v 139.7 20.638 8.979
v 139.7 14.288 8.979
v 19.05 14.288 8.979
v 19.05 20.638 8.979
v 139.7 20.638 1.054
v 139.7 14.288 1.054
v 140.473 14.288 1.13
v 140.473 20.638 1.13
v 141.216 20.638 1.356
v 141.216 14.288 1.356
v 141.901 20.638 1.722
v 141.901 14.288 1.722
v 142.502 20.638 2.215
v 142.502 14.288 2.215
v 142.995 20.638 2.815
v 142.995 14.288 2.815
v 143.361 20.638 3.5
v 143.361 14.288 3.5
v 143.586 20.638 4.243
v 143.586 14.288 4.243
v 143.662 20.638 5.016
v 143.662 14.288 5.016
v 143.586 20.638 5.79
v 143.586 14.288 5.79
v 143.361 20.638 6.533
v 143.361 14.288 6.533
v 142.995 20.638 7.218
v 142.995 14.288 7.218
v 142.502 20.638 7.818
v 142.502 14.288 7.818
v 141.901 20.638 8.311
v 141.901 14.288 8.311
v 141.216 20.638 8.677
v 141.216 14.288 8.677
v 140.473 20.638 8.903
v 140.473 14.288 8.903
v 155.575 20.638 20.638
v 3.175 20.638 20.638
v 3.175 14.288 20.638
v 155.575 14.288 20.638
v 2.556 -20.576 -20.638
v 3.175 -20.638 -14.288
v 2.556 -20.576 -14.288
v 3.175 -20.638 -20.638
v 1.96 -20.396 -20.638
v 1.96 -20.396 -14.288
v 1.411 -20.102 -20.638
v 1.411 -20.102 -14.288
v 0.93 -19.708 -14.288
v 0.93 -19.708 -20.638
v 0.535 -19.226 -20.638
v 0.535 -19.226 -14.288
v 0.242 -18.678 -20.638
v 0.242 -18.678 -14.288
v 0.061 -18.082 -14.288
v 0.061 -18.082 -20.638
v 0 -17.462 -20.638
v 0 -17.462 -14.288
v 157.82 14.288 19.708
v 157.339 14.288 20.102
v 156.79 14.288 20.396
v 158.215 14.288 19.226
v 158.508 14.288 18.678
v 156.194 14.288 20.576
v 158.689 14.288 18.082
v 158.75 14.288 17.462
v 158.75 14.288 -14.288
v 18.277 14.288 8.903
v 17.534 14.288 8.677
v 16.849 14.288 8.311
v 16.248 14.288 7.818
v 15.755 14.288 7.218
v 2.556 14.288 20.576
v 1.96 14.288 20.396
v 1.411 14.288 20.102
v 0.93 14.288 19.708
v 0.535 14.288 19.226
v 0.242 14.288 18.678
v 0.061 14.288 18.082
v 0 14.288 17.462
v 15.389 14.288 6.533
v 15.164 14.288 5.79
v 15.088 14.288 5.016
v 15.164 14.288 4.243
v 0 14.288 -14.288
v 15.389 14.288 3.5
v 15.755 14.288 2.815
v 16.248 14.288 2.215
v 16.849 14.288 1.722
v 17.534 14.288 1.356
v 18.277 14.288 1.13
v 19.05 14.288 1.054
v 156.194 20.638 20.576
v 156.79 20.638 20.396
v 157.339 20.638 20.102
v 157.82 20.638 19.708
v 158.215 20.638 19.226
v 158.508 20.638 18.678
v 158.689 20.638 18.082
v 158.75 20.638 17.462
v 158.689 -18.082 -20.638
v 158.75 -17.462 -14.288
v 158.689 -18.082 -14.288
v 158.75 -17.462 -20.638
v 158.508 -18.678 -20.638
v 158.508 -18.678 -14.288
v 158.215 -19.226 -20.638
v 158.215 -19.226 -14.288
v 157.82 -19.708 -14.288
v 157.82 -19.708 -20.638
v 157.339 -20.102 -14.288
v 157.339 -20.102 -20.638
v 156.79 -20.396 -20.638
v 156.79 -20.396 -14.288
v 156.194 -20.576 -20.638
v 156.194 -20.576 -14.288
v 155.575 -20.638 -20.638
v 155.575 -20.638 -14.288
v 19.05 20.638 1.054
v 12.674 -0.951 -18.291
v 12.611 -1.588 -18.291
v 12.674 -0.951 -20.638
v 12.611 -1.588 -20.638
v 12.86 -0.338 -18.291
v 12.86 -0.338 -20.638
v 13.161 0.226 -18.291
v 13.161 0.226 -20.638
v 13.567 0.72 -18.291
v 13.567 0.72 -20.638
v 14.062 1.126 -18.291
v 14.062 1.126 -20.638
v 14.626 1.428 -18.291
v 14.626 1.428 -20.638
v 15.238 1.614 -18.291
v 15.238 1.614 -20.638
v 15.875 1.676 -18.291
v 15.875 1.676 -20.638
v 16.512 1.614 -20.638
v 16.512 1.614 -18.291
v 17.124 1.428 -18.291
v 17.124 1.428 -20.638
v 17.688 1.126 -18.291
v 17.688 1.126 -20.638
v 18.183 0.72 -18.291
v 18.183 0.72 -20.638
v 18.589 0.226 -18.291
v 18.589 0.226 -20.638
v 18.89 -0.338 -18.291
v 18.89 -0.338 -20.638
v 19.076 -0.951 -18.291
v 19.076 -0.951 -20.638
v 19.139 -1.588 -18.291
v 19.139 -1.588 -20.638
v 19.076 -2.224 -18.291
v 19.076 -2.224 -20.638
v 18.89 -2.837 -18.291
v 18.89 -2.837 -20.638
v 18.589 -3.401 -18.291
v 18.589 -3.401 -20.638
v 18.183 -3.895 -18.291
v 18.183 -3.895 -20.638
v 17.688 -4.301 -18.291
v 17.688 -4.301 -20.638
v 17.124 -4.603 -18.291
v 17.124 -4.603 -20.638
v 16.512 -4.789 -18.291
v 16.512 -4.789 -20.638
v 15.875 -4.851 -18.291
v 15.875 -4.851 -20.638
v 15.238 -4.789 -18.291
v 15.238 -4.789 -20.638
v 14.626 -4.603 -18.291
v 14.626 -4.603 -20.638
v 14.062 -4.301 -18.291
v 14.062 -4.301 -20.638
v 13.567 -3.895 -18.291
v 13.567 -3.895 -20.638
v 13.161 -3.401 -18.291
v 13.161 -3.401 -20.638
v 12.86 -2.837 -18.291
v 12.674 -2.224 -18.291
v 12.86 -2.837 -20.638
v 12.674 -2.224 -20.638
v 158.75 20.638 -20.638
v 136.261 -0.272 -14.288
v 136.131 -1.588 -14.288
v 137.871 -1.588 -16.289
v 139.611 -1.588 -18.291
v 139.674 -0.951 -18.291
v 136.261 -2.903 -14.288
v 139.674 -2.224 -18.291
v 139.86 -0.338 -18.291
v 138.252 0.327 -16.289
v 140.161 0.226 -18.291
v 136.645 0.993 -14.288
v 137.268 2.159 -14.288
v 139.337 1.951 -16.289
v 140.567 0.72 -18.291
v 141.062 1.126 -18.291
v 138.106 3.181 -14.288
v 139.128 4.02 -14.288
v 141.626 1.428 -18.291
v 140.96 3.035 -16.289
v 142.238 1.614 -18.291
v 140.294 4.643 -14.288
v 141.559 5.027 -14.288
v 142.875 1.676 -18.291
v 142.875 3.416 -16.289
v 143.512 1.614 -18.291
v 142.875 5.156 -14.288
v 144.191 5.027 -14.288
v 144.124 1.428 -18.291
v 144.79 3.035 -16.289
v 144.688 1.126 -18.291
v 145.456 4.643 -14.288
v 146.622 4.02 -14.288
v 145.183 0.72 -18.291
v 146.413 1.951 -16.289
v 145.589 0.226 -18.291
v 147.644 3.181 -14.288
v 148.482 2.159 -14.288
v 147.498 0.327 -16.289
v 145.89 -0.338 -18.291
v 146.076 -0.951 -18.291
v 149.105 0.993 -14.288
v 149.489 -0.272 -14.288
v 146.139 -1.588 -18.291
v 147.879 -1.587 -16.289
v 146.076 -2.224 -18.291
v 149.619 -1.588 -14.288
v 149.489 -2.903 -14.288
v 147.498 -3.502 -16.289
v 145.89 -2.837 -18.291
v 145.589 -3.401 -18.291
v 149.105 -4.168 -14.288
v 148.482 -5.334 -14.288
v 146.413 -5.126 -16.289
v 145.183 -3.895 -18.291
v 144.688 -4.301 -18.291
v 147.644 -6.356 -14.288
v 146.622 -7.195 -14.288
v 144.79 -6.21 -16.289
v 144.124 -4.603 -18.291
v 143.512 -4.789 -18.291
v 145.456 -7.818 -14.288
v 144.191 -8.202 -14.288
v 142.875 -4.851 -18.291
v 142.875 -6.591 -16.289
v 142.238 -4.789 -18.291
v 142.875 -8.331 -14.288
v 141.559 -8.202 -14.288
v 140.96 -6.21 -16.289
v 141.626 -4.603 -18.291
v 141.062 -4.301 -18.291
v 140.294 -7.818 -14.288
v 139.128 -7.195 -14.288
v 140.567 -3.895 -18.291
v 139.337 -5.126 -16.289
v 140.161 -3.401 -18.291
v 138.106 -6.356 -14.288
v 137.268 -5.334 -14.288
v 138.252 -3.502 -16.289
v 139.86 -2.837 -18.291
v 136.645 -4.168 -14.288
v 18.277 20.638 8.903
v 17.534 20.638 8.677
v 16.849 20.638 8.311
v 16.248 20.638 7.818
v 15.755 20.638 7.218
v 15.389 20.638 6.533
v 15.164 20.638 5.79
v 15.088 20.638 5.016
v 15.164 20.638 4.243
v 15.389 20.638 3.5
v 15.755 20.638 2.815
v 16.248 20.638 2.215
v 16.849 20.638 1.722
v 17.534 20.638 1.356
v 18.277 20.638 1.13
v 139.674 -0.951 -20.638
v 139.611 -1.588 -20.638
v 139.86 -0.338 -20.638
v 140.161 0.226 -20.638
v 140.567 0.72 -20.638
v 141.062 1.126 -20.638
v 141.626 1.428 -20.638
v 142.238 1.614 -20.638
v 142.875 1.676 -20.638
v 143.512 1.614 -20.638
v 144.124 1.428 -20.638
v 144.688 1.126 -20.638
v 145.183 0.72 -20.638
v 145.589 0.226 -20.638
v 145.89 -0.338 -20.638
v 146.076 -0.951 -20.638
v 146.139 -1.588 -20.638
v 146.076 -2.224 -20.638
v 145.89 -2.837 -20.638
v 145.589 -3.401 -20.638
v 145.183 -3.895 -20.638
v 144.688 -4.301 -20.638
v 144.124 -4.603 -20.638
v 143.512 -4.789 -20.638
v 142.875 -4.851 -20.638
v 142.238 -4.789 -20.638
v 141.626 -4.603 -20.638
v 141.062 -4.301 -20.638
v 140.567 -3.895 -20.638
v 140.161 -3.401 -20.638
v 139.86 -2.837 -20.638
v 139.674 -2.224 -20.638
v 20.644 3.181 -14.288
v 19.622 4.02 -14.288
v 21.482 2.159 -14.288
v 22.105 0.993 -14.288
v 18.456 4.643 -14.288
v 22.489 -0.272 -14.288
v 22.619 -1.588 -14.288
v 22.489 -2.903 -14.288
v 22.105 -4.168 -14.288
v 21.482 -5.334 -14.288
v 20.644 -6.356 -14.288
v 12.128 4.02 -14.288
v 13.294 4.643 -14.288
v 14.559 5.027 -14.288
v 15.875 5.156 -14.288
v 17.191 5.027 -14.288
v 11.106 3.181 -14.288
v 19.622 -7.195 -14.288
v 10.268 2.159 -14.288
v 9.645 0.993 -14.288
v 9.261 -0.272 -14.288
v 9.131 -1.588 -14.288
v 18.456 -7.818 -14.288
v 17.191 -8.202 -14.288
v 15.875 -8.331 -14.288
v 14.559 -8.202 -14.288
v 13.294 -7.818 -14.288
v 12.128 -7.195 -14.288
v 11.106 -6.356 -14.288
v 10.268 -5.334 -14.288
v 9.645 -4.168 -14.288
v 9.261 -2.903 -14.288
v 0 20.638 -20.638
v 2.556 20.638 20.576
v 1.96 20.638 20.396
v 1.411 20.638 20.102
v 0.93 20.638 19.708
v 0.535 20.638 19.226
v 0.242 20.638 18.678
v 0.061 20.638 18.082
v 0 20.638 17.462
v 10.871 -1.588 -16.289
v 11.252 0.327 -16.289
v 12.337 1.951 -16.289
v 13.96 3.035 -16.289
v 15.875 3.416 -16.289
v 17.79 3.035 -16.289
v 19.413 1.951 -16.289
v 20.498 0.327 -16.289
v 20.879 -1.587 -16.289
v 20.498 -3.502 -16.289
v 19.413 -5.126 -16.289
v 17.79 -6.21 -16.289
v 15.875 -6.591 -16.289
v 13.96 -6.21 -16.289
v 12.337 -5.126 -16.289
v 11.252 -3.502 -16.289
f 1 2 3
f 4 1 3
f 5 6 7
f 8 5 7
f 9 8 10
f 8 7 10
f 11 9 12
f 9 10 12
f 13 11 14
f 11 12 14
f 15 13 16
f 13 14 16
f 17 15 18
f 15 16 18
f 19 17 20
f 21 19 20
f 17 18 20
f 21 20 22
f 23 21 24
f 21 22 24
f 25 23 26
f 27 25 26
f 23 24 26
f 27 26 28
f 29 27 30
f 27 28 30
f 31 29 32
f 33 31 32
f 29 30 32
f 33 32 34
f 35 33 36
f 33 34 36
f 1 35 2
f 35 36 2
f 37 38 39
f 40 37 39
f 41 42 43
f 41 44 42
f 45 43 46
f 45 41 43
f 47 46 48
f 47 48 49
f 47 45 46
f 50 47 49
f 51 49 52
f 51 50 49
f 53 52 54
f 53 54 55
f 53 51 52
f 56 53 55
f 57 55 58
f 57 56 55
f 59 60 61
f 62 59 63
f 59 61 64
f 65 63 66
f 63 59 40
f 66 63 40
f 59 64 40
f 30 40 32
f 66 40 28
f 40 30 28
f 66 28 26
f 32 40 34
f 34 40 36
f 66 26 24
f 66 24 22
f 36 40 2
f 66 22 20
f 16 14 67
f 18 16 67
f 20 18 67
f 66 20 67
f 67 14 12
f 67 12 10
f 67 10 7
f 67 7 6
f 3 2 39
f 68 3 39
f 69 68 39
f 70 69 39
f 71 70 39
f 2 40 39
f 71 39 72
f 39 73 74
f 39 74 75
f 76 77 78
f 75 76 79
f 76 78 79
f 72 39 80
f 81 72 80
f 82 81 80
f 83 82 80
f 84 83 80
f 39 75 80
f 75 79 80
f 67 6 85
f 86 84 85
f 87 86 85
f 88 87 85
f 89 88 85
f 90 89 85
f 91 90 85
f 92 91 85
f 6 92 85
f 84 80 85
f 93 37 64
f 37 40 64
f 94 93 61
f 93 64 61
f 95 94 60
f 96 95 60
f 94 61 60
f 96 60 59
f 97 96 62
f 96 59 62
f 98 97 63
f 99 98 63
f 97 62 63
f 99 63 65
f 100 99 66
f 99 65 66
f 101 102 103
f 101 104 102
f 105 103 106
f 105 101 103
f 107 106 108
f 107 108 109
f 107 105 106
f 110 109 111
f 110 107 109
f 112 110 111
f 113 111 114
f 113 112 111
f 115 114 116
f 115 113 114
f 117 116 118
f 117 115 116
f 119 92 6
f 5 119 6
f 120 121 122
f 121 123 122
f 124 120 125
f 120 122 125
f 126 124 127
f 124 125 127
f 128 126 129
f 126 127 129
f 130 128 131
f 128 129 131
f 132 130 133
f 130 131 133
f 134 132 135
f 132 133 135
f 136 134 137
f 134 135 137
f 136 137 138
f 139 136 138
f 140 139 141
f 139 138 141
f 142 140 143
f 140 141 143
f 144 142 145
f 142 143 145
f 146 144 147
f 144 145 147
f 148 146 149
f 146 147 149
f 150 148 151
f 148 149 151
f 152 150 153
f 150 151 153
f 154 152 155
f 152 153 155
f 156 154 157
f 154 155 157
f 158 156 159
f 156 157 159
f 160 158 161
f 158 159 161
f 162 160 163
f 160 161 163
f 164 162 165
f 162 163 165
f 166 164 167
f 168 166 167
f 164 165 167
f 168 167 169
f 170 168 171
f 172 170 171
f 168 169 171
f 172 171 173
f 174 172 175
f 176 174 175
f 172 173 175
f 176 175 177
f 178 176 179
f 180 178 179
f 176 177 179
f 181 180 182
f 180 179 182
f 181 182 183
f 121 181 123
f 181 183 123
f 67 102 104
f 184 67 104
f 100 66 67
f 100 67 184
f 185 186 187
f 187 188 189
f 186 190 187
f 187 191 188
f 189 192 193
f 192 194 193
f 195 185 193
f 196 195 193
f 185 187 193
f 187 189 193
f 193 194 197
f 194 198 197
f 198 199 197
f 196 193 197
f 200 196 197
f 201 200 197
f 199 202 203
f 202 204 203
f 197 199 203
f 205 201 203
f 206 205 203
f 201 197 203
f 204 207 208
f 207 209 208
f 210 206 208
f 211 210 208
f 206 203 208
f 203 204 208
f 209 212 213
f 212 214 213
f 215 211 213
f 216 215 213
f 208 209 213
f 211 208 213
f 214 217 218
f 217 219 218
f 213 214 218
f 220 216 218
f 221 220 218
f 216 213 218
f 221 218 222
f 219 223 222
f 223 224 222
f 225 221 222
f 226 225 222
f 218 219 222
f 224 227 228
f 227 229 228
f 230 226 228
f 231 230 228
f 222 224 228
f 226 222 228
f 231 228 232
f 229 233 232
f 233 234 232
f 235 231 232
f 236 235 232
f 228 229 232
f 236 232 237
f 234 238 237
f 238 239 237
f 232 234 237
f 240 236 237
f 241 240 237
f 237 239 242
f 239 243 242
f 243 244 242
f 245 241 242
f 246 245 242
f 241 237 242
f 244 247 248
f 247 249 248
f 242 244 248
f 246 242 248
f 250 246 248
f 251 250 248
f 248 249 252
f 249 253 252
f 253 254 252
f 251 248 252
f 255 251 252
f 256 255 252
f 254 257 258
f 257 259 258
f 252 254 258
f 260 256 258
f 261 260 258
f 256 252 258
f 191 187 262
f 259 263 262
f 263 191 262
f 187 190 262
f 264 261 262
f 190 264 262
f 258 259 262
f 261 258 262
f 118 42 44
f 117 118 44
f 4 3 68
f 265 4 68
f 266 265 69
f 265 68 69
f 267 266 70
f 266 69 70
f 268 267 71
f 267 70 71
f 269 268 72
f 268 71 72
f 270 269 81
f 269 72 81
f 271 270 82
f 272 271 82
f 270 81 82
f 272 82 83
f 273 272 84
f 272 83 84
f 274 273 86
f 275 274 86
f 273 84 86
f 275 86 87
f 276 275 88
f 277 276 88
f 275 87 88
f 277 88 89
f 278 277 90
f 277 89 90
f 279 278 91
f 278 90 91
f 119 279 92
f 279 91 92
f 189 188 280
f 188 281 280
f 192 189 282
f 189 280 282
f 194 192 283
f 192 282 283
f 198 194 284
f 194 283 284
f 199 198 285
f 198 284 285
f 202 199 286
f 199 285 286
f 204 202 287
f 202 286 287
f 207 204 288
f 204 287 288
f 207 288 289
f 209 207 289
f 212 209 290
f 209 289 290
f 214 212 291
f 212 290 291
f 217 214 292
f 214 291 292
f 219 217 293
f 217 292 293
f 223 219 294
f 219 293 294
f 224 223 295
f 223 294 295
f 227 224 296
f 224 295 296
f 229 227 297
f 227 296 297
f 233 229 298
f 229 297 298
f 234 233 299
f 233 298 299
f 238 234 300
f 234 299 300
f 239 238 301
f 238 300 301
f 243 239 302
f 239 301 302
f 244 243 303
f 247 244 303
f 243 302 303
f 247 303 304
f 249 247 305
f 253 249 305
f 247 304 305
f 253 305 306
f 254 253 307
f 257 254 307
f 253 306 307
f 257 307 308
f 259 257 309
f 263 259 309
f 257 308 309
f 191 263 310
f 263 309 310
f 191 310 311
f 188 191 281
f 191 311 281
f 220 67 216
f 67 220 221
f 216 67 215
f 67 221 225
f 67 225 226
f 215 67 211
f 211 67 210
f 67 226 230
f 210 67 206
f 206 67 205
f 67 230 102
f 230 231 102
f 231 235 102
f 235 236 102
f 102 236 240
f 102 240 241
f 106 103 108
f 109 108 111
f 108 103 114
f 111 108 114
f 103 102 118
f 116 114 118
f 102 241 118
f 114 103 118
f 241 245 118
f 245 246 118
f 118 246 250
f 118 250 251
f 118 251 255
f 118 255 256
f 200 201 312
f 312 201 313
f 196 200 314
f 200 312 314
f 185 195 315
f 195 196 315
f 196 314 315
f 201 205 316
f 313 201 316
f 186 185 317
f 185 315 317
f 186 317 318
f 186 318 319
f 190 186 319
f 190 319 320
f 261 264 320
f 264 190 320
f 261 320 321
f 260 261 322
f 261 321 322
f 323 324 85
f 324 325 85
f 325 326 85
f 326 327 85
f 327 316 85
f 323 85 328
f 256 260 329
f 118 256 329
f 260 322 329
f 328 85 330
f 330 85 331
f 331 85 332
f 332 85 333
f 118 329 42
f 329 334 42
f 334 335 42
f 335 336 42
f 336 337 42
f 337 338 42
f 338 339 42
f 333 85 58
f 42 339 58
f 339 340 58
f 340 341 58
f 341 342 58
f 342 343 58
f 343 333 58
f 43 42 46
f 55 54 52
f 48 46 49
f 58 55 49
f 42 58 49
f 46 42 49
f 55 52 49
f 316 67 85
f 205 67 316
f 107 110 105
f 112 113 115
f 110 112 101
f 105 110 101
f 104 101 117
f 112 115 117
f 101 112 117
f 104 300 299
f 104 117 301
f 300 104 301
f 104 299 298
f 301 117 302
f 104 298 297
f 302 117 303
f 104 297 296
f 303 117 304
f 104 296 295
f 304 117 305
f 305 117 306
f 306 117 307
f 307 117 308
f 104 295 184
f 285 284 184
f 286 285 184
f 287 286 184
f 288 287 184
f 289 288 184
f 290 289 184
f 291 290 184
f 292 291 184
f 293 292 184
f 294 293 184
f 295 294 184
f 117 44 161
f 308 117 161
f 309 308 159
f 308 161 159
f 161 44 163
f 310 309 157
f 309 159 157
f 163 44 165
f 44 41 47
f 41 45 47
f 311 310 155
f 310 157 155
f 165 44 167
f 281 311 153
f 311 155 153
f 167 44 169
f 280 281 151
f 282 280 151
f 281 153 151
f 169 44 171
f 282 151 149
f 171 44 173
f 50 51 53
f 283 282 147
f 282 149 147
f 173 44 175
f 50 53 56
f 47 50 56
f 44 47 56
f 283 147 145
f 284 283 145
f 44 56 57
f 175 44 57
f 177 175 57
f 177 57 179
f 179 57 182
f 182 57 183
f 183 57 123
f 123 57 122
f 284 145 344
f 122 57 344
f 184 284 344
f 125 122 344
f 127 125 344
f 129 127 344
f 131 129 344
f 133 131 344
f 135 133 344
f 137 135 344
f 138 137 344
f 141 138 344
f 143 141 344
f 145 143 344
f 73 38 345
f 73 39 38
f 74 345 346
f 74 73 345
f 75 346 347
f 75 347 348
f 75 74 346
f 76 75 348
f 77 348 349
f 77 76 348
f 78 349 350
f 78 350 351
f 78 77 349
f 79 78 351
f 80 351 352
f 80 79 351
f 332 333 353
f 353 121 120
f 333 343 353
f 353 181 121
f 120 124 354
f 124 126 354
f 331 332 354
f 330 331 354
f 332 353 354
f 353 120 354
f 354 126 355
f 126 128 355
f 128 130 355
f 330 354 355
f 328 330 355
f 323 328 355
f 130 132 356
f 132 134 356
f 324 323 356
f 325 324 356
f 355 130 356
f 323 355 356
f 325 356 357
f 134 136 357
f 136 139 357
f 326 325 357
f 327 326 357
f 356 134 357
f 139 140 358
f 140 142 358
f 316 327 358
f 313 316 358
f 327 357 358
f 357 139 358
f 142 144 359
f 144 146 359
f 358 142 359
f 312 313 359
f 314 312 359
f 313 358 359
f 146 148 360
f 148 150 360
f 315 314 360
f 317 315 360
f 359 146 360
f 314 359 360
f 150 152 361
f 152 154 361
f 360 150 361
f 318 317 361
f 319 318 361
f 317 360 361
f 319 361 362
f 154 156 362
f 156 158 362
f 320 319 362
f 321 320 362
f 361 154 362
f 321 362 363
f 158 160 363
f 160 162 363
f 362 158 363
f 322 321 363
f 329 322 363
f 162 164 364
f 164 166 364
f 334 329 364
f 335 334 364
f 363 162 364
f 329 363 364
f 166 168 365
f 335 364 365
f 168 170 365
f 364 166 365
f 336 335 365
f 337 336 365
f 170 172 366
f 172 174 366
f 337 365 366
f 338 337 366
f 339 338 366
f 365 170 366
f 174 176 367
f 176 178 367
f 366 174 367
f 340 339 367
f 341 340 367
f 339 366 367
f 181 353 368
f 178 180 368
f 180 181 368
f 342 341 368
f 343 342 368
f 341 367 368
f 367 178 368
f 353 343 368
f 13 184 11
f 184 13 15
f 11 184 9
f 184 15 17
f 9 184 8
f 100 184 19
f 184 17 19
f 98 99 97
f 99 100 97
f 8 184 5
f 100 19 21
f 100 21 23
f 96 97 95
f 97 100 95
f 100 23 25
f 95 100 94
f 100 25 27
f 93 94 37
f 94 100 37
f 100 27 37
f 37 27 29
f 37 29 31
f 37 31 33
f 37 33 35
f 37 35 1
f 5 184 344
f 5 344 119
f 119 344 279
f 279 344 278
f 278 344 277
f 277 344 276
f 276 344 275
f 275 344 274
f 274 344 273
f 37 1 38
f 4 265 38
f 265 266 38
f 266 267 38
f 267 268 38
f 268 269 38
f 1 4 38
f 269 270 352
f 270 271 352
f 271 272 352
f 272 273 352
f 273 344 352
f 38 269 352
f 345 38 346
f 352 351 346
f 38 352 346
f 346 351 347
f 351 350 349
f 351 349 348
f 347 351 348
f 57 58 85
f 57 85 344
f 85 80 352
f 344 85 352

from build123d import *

# Parameters (mm, degrees)
F1_DEPTH       = 158.75
F3_DEPTH       = 6.351
F5_D           = 6.5278
F5_CSINK_D     = 13.4874
F5_CSINK_ANGLE = 82
F6_R           = 3.175


with BuildPart() as f1:
    # F0 (on Right) → F1 (new body)
    with BuildSketch(Plane.YZ):
        Polygon((20.6375, 20.6375), (14.2875, 20.6375), (14.2875, -14.2875), (-20.6375, -14.2875), (-20.6375, -20.6375), (20.6375, -20.6375), align=None)
    extrude(amount=F1_DEPTH)

    # F2 (on face) → F3 (cut, through all)
    with BuildSketch(Plane.XZ.offset(-14.2875)):
        with BuildLine():
            ThreePointArc((19.05, 8.9789), (15.0876, 5.0165), (19.05, 1.0541))
            Line((19.05, 1.0541), (139.7, 1.0541))
            ThreePointArc((139.7, 1.0541), (143.6624, 5.0165), (139.7, 8.9789))
            Line((139.7, 8.9789), (19.05, 8.9789))
        make_face()
    extrude(amount=-F3_DEPTH, mode=Mode.SUBTRACT)

    # F5 (through all)
    with Locations(Plane.XY.offset(-14.2875)):
        with Locations((15.875, -1.5875), (142.875, -1.5875)):
            CounterSinkHole(F5_D / 2, F5_CSINK_D / 2, counter_sink_angle=F5_CSINK_ANGLE)

    # F6
    f6_edges = [f1.edges().sort_by_distance(p)[0] for p in [
        (0, 17.4625, 20.6375),
        (158.75, 17.4625, 20.6375),
        (158.75, -20.6375, -17.4625),
        (0, -20.6375, -17.4625),
    ]]
    fillet(f6_edges, radius=F6_R)


solid = f1.part
